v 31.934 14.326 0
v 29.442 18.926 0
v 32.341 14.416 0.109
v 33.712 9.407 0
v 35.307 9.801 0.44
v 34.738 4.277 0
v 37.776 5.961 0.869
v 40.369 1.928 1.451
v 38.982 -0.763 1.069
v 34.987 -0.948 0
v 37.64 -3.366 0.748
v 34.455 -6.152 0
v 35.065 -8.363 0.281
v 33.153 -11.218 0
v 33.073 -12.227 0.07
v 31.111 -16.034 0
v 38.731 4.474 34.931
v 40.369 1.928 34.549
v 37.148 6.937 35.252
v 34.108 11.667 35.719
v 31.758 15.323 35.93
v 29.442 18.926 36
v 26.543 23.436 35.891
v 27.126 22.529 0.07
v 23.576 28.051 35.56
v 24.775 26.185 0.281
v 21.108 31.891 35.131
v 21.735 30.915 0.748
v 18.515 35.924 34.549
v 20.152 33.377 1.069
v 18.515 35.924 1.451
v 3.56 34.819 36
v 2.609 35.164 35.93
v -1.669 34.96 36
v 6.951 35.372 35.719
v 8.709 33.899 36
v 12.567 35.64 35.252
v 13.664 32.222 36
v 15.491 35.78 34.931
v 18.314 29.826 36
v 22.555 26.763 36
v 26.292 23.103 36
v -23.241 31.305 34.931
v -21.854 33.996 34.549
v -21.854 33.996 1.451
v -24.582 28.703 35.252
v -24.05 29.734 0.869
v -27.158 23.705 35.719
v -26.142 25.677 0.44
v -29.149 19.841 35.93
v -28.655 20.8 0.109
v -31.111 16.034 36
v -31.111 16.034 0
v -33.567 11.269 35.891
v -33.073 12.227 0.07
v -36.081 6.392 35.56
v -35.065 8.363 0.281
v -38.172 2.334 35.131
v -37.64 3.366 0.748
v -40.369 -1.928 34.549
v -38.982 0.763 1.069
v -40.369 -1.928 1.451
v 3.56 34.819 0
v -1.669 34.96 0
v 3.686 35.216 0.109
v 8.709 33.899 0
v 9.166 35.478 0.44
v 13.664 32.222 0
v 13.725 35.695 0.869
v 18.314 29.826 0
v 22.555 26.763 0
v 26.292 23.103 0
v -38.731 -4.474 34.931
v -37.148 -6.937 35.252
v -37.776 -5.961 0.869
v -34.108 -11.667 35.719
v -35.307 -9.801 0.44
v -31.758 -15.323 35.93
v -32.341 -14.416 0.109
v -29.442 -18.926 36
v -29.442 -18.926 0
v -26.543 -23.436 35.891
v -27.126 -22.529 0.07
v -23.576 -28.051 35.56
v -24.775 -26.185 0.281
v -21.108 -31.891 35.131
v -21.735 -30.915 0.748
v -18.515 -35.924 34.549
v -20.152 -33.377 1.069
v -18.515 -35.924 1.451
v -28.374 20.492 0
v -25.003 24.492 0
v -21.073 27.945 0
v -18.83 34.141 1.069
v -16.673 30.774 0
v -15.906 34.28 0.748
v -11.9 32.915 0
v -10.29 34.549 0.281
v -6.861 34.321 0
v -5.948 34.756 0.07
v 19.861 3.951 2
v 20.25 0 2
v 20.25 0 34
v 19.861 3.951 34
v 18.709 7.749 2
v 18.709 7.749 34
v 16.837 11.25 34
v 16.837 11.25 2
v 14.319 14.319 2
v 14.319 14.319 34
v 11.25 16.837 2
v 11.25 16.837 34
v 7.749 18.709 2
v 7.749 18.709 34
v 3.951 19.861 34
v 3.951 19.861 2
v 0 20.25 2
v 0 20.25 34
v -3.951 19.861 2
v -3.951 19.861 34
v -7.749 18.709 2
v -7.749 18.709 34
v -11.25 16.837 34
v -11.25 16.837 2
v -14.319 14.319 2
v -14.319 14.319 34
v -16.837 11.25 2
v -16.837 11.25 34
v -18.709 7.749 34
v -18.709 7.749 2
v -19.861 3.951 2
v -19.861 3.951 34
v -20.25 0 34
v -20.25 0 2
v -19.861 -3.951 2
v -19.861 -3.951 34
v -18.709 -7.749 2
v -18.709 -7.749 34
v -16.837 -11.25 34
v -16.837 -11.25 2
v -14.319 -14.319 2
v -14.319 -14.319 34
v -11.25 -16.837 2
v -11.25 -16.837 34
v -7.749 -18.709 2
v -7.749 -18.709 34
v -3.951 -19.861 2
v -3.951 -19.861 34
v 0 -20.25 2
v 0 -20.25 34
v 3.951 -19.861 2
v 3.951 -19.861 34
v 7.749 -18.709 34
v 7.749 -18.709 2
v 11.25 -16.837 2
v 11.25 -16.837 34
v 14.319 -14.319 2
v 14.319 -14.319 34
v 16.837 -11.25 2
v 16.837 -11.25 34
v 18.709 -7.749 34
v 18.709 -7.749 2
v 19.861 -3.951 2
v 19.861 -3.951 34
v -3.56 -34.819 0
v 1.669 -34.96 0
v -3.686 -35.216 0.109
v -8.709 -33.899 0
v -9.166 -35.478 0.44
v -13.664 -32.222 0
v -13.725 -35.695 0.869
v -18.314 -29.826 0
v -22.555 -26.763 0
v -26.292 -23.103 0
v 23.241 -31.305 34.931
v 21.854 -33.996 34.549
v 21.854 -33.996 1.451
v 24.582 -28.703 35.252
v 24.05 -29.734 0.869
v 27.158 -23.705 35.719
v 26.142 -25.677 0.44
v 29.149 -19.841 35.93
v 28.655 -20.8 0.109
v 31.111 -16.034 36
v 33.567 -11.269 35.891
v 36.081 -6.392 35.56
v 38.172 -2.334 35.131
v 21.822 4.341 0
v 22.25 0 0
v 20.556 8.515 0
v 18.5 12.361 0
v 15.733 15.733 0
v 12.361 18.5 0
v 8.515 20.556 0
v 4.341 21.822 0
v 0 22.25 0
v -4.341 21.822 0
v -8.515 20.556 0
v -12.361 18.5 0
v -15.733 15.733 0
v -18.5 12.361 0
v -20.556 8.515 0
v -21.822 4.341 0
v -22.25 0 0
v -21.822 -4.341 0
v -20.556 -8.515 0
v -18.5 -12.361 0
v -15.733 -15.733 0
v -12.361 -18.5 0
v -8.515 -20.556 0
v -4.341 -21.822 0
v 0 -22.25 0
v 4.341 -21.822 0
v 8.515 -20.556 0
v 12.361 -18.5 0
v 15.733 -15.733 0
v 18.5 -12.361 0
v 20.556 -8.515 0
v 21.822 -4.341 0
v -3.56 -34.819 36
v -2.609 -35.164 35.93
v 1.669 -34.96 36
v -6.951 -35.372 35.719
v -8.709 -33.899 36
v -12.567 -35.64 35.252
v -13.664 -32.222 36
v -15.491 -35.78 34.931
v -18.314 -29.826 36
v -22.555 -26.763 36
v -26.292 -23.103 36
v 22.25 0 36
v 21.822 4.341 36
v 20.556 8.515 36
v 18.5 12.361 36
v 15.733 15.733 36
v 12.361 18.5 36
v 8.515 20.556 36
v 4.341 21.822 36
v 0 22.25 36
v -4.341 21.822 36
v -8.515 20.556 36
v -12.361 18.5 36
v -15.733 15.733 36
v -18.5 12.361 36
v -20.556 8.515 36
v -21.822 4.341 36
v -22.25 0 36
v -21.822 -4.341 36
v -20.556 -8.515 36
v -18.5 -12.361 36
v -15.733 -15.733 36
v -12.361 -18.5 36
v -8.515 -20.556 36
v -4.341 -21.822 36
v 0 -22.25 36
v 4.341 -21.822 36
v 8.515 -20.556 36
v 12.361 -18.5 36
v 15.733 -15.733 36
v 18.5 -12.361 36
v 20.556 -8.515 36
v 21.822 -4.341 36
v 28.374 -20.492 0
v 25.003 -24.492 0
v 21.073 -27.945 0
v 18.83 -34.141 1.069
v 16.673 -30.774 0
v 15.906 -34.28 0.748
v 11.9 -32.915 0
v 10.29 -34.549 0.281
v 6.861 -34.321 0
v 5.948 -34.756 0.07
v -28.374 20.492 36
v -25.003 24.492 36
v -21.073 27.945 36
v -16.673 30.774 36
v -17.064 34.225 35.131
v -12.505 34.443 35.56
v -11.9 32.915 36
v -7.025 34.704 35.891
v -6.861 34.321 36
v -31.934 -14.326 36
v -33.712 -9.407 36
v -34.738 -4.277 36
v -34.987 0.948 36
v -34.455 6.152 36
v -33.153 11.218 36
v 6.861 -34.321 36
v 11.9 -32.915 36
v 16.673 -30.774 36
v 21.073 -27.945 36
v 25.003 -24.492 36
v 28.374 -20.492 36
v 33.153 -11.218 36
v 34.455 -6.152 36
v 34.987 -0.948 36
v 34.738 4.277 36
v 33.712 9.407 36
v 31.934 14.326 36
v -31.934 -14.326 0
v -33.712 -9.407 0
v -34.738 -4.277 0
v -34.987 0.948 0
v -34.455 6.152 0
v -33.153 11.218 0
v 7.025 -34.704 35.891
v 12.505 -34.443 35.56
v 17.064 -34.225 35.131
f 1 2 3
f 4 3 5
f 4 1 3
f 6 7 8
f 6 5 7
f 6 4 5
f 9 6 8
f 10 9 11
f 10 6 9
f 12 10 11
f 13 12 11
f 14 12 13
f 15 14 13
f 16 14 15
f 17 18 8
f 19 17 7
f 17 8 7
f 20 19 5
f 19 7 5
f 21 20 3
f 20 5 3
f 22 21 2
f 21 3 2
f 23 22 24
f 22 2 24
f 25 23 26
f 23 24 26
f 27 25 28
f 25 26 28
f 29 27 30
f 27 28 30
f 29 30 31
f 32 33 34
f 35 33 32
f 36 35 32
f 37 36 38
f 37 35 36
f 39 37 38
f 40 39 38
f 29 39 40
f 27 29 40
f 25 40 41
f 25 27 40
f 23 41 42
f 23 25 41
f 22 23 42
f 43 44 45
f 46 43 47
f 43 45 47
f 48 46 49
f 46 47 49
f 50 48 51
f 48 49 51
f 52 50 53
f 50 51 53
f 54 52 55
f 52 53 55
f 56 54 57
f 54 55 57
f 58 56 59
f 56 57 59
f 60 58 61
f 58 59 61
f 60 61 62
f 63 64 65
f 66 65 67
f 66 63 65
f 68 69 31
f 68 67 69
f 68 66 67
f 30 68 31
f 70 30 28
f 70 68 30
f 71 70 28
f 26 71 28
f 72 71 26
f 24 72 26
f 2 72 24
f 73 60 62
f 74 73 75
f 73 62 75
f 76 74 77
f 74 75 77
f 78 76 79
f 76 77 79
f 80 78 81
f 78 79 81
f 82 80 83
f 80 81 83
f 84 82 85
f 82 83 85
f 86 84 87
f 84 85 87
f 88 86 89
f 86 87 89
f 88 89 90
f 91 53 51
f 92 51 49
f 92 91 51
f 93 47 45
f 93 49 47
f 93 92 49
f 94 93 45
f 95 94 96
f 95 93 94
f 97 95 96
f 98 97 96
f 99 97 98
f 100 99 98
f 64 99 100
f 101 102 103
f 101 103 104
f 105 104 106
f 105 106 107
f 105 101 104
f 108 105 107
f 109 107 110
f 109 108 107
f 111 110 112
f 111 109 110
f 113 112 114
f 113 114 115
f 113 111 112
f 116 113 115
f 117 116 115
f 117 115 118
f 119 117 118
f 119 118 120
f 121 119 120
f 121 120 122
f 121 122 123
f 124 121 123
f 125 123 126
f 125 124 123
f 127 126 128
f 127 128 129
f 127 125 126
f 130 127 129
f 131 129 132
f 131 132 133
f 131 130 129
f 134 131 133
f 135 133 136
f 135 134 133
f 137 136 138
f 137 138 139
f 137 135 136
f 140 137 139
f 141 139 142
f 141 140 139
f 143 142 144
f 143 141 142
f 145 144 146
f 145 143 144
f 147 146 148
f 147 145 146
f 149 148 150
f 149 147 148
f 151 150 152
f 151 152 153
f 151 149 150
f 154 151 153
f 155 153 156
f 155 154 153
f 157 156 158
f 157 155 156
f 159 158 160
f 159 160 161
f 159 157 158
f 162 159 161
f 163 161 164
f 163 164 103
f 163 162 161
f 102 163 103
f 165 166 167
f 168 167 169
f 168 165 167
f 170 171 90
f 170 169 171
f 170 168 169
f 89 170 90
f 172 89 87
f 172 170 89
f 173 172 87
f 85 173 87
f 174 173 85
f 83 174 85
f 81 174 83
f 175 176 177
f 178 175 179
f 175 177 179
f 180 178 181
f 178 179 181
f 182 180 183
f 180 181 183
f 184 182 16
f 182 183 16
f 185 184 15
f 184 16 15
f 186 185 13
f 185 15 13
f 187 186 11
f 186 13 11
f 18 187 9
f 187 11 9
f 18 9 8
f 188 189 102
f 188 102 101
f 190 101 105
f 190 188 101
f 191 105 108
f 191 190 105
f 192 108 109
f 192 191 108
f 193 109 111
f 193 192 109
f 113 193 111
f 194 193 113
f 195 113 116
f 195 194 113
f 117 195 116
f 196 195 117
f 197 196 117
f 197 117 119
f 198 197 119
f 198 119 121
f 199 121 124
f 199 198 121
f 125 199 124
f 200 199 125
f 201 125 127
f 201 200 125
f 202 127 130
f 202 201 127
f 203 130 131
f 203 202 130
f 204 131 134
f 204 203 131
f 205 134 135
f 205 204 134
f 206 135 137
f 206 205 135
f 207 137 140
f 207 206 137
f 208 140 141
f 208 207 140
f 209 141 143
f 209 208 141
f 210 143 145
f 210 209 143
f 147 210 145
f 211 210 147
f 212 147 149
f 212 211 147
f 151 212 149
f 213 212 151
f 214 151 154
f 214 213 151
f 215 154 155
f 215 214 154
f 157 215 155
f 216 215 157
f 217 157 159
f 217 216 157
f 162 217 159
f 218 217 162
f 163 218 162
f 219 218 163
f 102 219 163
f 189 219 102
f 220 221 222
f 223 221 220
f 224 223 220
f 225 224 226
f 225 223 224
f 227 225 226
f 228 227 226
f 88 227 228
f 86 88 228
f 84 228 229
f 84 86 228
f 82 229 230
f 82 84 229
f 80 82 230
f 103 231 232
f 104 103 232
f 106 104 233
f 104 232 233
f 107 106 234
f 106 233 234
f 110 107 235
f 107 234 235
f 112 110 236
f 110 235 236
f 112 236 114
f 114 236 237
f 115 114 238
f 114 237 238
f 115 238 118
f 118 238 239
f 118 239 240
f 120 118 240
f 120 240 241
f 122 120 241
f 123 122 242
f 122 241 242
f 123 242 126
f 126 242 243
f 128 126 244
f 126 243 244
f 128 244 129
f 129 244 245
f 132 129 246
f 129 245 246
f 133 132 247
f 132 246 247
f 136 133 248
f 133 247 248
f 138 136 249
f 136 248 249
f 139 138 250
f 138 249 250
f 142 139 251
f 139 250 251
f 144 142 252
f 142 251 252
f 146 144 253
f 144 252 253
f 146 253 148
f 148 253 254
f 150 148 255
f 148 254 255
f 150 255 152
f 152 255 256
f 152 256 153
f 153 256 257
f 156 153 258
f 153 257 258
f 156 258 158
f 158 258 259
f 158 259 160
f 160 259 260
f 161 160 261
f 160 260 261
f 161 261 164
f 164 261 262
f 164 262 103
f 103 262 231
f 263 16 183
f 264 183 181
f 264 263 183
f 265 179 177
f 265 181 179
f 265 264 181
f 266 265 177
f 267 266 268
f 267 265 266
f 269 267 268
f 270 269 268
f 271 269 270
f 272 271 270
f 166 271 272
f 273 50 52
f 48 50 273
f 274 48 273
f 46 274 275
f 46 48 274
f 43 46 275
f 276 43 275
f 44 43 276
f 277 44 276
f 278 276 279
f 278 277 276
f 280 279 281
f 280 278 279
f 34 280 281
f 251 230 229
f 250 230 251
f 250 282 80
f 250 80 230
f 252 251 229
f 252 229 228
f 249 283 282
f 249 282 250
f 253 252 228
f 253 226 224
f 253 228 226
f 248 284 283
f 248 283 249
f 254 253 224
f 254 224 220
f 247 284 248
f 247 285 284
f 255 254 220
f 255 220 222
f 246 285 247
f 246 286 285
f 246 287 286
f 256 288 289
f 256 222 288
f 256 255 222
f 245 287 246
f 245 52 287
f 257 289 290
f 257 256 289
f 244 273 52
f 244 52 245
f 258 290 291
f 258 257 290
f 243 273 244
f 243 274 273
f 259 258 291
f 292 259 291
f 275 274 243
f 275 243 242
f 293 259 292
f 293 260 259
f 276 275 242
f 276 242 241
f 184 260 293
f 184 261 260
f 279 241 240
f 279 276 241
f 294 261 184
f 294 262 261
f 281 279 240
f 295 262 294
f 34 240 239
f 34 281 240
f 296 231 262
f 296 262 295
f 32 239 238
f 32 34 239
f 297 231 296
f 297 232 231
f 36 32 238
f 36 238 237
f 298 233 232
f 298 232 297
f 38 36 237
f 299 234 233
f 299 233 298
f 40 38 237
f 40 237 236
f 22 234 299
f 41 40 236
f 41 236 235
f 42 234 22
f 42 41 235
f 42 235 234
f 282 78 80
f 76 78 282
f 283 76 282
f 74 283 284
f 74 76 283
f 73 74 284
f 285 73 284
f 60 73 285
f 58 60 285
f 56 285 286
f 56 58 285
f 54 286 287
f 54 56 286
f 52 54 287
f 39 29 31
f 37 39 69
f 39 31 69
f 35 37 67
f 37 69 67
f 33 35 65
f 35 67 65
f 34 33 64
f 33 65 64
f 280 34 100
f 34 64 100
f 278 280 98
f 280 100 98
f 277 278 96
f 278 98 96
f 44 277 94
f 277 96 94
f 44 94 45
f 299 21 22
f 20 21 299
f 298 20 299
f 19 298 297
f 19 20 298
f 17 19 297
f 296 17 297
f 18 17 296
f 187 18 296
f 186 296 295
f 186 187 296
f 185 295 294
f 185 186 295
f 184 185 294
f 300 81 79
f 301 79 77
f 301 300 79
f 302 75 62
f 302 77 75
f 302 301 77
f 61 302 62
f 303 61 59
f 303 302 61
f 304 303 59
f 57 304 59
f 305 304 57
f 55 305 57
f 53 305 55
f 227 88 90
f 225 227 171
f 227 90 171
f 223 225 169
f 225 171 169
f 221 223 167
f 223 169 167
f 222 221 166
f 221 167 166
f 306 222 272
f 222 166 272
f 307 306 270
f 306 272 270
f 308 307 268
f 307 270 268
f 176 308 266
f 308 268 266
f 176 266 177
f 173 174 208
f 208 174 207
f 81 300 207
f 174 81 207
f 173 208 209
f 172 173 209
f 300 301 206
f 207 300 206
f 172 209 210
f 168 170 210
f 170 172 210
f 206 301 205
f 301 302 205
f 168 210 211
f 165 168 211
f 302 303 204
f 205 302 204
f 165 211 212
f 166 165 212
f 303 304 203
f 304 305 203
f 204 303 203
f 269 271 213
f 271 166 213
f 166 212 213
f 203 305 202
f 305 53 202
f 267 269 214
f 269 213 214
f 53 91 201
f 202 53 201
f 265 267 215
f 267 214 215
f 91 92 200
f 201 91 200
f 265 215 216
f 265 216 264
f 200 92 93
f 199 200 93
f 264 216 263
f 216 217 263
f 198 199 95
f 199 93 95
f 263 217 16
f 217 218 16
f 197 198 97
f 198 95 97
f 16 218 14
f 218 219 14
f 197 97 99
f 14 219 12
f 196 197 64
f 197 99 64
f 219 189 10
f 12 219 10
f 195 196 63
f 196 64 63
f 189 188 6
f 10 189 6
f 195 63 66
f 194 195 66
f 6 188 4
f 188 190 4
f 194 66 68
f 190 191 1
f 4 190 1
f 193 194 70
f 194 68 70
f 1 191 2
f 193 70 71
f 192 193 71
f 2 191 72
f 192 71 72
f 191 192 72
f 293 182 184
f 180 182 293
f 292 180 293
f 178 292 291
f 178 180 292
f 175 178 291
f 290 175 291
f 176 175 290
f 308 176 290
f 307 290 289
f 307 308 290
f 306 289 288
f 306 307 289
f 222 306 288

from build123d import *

# Parameters (mm, degrees)
F0_R     = 20.25
F1_DEPTH = 36
F2_SIZE  = 2


with BuildPart() as f1:
    # F0 (on Top) → F1 (new body)
    with BuildSketch(Plane.XY):
        Polygon((21.8537385337, -33.9962857594), (40.3685163688, 1.9277498582), (18.5147778351, 35.9240356175), (-21.8537385337, 33.9962857594), (-40.3685163688, -1.9277498582), (-18.5147778351, -35.9240356175), align=None)
        Circle(F0_R, mode=Mode.SUBTRACT)
    extrude(amount=F1_DEPTH)

    # F2
    f2_edges = [f1.edges().sort_by_distance(p)[0] for p in [
        (-20.25, 0, 36),
        (-20.25, 0, 0),
    ]]
    chamfer(f2_edges, length=F2_SIZE)

    # F5 (on 3pt) → F6 (revolve, cut)
    with BuildSketch(Plane(origin=(0, 0, 0), x_dir=(0.998861734, 0.0476994386, 0), z_dir=(0.0476994386, -0.998861734, 0))):
        Polygon((35, 37.1090732515), (35, 36), (44.6592582629, 33.411809549), (44.6592582629, 39.6752795403), align=None)
        Polygon((35, -1.1090732515), (44.6592582629, -3.6752795403), (44.6592582629, 2.588190451), (35, 0), align=None)
    revolve(axis=Axis((0, 0, 0), (0, 0, -1)), mode=Mode.SUBTRACT)


solid = f1.part
